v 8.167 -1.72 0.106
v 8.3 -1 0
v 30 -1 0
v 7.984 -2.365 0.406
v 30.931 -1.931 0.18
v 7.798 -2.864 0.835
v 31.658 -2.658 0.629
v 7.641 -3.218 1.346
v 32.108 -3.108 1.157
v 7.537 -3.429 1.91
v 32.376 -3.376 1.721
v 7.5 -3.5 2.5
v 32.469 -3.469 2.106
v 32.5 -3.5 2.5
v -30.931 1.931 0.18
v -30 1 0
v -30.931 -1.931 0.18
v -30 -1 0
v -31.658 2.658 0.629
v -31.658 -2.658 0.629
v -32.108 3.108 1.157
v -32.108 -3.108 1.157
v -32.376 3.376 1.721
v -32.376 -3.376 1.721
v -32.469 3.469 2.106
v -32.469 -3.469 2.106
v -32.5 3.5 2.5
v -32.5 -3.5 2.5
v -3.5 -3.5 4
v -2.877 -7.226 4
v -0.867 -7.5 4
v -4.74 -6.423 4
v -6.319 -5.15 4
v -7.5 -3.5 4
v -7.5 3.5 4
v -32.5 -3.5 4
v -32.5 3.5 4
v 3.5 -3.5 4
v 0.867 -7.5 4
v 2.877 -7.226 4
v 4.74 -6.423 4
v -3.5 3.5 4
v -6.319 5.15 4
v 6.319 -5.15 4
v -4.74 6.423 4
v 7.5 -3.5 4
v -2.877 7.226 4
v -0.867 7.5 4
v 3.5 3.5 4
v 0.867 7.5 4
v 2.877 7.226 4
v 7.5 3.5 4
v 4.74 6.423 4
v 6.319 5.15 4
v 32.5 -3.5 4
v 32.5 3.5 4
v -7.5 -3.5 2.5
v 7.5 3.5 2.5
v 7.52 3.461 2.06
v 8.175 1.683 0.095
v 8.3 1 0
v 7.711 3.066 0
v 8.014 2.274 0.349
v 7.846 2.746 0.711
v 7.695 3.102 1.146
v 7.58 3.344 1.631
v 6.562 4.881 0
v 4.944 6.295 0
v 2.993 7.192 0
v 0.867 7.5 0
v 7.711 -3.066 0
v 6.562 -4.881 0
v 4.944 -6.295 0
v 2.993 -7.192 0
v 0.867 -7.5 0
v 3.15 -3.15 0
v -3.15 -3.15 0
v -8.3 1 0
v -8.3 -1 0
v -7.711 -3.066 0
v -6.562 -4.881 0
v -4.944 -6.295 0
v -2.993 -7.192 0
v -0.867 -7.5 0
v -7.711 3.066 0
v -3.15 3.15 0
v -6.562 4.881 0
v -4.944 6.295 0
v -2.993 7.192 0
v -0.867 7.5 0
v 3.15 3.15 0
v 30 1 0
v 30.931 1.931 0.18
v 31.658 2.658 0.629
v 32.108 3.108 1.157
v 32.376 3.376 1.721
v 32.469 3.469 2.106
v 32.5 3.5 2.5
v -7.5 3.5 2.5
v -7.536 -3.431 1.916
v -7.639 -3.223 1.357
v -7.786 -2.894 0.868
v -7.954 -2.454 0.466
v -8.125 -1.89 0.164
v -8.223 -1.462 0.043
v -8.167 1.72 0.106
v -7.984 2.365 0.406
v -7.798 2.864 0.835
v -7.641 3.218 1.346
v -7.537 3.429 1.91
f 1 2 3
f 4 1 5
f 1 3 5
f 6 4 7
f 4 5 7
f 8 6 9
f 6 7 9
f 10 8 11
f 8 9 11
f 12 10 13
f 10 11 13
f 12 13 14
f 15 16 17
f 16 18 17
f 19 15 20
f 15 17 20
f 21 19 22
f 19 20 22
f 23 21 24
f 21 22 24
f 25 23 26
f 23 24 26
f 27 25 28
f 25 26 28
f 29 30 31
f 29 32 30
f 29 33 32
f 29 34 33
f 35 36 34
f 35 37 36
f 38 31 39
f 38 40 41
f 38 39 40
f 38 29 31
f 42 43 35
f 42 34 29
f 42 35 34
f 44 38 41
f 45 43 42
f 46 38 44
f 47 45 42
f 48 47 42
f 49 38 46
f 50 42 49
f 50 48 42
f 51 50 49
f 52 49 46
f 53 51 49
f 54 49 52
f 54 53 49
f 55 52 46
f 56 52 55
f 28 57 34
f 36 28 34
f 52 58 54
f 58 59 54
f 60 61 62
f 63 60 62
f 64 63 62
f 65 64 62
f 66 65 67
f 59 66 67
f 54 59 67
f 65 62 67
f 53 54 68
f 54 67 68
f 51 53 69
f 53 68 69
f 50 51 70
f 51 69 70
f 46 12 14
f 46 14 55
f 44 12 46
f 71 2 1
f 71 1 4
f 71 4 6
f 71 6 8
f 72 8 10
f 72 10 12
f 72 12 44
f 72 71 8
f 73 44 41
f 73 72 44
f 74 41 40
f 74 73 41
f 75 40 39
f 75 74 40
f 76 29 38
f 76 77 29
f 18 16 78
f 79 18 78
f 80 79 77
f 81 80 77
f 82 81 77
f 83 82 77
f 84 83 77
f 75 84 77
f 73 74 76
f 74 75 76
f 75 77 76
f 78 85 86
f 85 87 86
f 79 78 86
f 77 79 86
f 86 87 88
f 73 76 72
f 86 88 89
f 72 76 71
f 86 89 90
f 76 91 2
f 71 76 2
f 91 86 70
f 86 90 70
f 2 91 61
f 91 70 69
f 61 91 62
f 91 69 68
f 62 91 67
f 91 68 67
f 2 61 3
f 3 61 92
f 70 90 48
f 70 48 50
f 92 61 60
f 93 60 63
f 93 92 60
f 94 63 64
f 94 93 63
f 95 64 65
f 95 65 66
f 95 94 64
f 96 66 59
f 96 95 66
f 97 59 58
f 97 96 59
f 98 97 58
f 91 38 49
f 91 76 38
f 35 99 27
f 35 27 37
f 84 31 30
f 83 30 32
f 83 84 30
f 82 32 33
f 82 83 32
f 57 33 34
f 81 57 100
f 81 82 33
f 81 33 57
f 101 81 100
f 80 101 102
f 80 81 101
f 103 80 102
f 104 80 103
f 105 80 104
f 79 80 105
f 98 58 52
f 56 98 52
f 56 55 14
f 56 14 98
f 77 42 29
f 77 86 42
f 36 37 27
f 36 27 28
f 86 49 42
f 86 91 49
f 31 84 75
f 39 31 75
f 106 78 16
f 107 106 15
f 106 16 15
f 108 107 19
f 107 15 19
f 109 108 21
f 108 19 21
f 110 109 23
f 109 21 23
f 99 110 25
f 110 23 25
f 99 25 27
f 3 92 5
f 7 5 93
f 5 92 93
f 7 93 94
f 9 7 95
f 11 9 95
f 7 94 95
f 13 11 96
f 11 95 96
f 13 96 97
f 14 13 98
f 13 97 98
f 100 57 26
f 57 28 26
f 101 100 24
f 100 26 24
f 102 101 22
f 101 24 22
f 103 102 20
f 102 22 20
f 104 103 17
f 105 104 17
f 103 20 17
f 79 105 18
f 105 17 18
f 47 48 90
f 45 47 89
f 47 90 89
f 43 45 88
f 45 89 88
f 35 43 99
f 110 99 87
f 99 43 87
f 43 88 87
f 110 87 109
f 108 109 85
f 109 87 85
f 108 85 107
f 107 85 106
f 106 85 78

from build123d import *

# Parameters (mm, degrees)
F0_W        = 15
F0_H        = 15
F0_W_2      = 7
F0_H_2      = 7
F1_DEPTH    = 4
F2_W        = 7
F2_H        = 7
F3_DEPTH    = 4
F3_TAPER    = 5
F4_W        = 7
F4_H        = 4
F5_DEPTH    = 25
F6_W        = 7
F6_H        = 4
F7_DEPTH    = 25
F8_T1_DEPTH = 37.1662479036
F9_R        = 2.5


# Not quite as in the source:
# - a fillet or chamfer that OpenCascade refuses, or shapes differently, is made with other operations: its cross-section is extruded or revolved along the edge and cut away or added


with BuildPart() as f1:
    # F0 (on Top) → F1 (new body)
    with BuildSketch(Plane.XY):
        Rectangle(F0_W, F0_H)
        Rectangle(F0_W_2, F0_H_2, mode=Mode.SUBTRACT)
        Rectangle(F0_W_2, F0_H_2)
    extrude(amount=F1_DEPTH)

    # F2 (on face) → F3 (cut)
    with BuildSketch(Plane.XY.offset(4)):
        Rectangle(F2_W, F2_H)
    extrude(amount=-F3_DEPTH, taper=F3_TAPER, mode=Mode.SUBTRACT)

    # F4 (on face) → F5 (join)
    with BuildSketch(Plane.YZ.offset(7.5)):
        with Locations((0, 2)):
            Rectangle(F4_W, F4_H)
    extrude(amount=F5_DEPTH)

    # F6 (on face) → F7 (join)
    with BuildSketch(Plane(origin=(-7.5, 0, 0), x_dir=(0, -1, 0), z_dir=(-1, 0, 0))):
        with Locations((0, 2)):
            Rectangle(F6_W, F6_H)
    extrude(amount=F7_DEPTH)

    # F8: fillet of radius 7.5 on 4 edges, made by hand

    # F8_s2 → F8_t1 (cut)
    with BuildSketch(Plane.XY.offset(-16.5831239518)):
        with BuildLine():
            ThreePointArc((-0.8667504193, 7.5), (-4.7397337655, 6.4226162893), (-7.5, 3.5))
            Line((-7.5, 3.5), (-7.5, 7.5))
            Line((-7.5, 7.5), (-0.8667504193, 7.5))
        make_face()
        with BuildLine():
            ThreePointArc((7.5, 3.5), (4.7397337655, 6.4226162893), (0.8667504193, 7.5))
            Line((0.8667504193, 7.5), (7.5, 7.5))
            Line((7.5, 7.5), (7.5, 3.5))
        make_face()
        with BuildLine():
            ThreePointArc((7.5, -3.5), (4.7397337655, -6.4226162893), (0.8667504193, -7.5))
            Line((0.8667504193, -7.5), (7.5, -7.5))
            Line((7.5, -7.5), (7.5, -3.5))
        make_face()
        with BuildLine():
            ThreePointArc((-0.8667504193, -7.5), (-4.7397337655, -6.4226162893), (-7.5, -3.5))
            Line((-7.5, -3.5), (-7.5, -7.5))
            Line((-7.5, -7.5), (-0.8667504193, -7.5))
        make_face()
    extrude(amount=F8_T1_DEPTH, mode=Mode.SUBTRACT)

    # F9
    f9_edges = [f1.edges().sort_by_distance(p)[0] for p in [
        (-32.5, 0, 0),
        (-20, -3.5, 0),
        (-20, 3.5, 0),
        (20, 3.5, 0),
        (32.5, 0, 0),
        (20, -3.5, 0),
    ]]
    fillet(f9_edges, radius=F9_R)


solid = f1.part
